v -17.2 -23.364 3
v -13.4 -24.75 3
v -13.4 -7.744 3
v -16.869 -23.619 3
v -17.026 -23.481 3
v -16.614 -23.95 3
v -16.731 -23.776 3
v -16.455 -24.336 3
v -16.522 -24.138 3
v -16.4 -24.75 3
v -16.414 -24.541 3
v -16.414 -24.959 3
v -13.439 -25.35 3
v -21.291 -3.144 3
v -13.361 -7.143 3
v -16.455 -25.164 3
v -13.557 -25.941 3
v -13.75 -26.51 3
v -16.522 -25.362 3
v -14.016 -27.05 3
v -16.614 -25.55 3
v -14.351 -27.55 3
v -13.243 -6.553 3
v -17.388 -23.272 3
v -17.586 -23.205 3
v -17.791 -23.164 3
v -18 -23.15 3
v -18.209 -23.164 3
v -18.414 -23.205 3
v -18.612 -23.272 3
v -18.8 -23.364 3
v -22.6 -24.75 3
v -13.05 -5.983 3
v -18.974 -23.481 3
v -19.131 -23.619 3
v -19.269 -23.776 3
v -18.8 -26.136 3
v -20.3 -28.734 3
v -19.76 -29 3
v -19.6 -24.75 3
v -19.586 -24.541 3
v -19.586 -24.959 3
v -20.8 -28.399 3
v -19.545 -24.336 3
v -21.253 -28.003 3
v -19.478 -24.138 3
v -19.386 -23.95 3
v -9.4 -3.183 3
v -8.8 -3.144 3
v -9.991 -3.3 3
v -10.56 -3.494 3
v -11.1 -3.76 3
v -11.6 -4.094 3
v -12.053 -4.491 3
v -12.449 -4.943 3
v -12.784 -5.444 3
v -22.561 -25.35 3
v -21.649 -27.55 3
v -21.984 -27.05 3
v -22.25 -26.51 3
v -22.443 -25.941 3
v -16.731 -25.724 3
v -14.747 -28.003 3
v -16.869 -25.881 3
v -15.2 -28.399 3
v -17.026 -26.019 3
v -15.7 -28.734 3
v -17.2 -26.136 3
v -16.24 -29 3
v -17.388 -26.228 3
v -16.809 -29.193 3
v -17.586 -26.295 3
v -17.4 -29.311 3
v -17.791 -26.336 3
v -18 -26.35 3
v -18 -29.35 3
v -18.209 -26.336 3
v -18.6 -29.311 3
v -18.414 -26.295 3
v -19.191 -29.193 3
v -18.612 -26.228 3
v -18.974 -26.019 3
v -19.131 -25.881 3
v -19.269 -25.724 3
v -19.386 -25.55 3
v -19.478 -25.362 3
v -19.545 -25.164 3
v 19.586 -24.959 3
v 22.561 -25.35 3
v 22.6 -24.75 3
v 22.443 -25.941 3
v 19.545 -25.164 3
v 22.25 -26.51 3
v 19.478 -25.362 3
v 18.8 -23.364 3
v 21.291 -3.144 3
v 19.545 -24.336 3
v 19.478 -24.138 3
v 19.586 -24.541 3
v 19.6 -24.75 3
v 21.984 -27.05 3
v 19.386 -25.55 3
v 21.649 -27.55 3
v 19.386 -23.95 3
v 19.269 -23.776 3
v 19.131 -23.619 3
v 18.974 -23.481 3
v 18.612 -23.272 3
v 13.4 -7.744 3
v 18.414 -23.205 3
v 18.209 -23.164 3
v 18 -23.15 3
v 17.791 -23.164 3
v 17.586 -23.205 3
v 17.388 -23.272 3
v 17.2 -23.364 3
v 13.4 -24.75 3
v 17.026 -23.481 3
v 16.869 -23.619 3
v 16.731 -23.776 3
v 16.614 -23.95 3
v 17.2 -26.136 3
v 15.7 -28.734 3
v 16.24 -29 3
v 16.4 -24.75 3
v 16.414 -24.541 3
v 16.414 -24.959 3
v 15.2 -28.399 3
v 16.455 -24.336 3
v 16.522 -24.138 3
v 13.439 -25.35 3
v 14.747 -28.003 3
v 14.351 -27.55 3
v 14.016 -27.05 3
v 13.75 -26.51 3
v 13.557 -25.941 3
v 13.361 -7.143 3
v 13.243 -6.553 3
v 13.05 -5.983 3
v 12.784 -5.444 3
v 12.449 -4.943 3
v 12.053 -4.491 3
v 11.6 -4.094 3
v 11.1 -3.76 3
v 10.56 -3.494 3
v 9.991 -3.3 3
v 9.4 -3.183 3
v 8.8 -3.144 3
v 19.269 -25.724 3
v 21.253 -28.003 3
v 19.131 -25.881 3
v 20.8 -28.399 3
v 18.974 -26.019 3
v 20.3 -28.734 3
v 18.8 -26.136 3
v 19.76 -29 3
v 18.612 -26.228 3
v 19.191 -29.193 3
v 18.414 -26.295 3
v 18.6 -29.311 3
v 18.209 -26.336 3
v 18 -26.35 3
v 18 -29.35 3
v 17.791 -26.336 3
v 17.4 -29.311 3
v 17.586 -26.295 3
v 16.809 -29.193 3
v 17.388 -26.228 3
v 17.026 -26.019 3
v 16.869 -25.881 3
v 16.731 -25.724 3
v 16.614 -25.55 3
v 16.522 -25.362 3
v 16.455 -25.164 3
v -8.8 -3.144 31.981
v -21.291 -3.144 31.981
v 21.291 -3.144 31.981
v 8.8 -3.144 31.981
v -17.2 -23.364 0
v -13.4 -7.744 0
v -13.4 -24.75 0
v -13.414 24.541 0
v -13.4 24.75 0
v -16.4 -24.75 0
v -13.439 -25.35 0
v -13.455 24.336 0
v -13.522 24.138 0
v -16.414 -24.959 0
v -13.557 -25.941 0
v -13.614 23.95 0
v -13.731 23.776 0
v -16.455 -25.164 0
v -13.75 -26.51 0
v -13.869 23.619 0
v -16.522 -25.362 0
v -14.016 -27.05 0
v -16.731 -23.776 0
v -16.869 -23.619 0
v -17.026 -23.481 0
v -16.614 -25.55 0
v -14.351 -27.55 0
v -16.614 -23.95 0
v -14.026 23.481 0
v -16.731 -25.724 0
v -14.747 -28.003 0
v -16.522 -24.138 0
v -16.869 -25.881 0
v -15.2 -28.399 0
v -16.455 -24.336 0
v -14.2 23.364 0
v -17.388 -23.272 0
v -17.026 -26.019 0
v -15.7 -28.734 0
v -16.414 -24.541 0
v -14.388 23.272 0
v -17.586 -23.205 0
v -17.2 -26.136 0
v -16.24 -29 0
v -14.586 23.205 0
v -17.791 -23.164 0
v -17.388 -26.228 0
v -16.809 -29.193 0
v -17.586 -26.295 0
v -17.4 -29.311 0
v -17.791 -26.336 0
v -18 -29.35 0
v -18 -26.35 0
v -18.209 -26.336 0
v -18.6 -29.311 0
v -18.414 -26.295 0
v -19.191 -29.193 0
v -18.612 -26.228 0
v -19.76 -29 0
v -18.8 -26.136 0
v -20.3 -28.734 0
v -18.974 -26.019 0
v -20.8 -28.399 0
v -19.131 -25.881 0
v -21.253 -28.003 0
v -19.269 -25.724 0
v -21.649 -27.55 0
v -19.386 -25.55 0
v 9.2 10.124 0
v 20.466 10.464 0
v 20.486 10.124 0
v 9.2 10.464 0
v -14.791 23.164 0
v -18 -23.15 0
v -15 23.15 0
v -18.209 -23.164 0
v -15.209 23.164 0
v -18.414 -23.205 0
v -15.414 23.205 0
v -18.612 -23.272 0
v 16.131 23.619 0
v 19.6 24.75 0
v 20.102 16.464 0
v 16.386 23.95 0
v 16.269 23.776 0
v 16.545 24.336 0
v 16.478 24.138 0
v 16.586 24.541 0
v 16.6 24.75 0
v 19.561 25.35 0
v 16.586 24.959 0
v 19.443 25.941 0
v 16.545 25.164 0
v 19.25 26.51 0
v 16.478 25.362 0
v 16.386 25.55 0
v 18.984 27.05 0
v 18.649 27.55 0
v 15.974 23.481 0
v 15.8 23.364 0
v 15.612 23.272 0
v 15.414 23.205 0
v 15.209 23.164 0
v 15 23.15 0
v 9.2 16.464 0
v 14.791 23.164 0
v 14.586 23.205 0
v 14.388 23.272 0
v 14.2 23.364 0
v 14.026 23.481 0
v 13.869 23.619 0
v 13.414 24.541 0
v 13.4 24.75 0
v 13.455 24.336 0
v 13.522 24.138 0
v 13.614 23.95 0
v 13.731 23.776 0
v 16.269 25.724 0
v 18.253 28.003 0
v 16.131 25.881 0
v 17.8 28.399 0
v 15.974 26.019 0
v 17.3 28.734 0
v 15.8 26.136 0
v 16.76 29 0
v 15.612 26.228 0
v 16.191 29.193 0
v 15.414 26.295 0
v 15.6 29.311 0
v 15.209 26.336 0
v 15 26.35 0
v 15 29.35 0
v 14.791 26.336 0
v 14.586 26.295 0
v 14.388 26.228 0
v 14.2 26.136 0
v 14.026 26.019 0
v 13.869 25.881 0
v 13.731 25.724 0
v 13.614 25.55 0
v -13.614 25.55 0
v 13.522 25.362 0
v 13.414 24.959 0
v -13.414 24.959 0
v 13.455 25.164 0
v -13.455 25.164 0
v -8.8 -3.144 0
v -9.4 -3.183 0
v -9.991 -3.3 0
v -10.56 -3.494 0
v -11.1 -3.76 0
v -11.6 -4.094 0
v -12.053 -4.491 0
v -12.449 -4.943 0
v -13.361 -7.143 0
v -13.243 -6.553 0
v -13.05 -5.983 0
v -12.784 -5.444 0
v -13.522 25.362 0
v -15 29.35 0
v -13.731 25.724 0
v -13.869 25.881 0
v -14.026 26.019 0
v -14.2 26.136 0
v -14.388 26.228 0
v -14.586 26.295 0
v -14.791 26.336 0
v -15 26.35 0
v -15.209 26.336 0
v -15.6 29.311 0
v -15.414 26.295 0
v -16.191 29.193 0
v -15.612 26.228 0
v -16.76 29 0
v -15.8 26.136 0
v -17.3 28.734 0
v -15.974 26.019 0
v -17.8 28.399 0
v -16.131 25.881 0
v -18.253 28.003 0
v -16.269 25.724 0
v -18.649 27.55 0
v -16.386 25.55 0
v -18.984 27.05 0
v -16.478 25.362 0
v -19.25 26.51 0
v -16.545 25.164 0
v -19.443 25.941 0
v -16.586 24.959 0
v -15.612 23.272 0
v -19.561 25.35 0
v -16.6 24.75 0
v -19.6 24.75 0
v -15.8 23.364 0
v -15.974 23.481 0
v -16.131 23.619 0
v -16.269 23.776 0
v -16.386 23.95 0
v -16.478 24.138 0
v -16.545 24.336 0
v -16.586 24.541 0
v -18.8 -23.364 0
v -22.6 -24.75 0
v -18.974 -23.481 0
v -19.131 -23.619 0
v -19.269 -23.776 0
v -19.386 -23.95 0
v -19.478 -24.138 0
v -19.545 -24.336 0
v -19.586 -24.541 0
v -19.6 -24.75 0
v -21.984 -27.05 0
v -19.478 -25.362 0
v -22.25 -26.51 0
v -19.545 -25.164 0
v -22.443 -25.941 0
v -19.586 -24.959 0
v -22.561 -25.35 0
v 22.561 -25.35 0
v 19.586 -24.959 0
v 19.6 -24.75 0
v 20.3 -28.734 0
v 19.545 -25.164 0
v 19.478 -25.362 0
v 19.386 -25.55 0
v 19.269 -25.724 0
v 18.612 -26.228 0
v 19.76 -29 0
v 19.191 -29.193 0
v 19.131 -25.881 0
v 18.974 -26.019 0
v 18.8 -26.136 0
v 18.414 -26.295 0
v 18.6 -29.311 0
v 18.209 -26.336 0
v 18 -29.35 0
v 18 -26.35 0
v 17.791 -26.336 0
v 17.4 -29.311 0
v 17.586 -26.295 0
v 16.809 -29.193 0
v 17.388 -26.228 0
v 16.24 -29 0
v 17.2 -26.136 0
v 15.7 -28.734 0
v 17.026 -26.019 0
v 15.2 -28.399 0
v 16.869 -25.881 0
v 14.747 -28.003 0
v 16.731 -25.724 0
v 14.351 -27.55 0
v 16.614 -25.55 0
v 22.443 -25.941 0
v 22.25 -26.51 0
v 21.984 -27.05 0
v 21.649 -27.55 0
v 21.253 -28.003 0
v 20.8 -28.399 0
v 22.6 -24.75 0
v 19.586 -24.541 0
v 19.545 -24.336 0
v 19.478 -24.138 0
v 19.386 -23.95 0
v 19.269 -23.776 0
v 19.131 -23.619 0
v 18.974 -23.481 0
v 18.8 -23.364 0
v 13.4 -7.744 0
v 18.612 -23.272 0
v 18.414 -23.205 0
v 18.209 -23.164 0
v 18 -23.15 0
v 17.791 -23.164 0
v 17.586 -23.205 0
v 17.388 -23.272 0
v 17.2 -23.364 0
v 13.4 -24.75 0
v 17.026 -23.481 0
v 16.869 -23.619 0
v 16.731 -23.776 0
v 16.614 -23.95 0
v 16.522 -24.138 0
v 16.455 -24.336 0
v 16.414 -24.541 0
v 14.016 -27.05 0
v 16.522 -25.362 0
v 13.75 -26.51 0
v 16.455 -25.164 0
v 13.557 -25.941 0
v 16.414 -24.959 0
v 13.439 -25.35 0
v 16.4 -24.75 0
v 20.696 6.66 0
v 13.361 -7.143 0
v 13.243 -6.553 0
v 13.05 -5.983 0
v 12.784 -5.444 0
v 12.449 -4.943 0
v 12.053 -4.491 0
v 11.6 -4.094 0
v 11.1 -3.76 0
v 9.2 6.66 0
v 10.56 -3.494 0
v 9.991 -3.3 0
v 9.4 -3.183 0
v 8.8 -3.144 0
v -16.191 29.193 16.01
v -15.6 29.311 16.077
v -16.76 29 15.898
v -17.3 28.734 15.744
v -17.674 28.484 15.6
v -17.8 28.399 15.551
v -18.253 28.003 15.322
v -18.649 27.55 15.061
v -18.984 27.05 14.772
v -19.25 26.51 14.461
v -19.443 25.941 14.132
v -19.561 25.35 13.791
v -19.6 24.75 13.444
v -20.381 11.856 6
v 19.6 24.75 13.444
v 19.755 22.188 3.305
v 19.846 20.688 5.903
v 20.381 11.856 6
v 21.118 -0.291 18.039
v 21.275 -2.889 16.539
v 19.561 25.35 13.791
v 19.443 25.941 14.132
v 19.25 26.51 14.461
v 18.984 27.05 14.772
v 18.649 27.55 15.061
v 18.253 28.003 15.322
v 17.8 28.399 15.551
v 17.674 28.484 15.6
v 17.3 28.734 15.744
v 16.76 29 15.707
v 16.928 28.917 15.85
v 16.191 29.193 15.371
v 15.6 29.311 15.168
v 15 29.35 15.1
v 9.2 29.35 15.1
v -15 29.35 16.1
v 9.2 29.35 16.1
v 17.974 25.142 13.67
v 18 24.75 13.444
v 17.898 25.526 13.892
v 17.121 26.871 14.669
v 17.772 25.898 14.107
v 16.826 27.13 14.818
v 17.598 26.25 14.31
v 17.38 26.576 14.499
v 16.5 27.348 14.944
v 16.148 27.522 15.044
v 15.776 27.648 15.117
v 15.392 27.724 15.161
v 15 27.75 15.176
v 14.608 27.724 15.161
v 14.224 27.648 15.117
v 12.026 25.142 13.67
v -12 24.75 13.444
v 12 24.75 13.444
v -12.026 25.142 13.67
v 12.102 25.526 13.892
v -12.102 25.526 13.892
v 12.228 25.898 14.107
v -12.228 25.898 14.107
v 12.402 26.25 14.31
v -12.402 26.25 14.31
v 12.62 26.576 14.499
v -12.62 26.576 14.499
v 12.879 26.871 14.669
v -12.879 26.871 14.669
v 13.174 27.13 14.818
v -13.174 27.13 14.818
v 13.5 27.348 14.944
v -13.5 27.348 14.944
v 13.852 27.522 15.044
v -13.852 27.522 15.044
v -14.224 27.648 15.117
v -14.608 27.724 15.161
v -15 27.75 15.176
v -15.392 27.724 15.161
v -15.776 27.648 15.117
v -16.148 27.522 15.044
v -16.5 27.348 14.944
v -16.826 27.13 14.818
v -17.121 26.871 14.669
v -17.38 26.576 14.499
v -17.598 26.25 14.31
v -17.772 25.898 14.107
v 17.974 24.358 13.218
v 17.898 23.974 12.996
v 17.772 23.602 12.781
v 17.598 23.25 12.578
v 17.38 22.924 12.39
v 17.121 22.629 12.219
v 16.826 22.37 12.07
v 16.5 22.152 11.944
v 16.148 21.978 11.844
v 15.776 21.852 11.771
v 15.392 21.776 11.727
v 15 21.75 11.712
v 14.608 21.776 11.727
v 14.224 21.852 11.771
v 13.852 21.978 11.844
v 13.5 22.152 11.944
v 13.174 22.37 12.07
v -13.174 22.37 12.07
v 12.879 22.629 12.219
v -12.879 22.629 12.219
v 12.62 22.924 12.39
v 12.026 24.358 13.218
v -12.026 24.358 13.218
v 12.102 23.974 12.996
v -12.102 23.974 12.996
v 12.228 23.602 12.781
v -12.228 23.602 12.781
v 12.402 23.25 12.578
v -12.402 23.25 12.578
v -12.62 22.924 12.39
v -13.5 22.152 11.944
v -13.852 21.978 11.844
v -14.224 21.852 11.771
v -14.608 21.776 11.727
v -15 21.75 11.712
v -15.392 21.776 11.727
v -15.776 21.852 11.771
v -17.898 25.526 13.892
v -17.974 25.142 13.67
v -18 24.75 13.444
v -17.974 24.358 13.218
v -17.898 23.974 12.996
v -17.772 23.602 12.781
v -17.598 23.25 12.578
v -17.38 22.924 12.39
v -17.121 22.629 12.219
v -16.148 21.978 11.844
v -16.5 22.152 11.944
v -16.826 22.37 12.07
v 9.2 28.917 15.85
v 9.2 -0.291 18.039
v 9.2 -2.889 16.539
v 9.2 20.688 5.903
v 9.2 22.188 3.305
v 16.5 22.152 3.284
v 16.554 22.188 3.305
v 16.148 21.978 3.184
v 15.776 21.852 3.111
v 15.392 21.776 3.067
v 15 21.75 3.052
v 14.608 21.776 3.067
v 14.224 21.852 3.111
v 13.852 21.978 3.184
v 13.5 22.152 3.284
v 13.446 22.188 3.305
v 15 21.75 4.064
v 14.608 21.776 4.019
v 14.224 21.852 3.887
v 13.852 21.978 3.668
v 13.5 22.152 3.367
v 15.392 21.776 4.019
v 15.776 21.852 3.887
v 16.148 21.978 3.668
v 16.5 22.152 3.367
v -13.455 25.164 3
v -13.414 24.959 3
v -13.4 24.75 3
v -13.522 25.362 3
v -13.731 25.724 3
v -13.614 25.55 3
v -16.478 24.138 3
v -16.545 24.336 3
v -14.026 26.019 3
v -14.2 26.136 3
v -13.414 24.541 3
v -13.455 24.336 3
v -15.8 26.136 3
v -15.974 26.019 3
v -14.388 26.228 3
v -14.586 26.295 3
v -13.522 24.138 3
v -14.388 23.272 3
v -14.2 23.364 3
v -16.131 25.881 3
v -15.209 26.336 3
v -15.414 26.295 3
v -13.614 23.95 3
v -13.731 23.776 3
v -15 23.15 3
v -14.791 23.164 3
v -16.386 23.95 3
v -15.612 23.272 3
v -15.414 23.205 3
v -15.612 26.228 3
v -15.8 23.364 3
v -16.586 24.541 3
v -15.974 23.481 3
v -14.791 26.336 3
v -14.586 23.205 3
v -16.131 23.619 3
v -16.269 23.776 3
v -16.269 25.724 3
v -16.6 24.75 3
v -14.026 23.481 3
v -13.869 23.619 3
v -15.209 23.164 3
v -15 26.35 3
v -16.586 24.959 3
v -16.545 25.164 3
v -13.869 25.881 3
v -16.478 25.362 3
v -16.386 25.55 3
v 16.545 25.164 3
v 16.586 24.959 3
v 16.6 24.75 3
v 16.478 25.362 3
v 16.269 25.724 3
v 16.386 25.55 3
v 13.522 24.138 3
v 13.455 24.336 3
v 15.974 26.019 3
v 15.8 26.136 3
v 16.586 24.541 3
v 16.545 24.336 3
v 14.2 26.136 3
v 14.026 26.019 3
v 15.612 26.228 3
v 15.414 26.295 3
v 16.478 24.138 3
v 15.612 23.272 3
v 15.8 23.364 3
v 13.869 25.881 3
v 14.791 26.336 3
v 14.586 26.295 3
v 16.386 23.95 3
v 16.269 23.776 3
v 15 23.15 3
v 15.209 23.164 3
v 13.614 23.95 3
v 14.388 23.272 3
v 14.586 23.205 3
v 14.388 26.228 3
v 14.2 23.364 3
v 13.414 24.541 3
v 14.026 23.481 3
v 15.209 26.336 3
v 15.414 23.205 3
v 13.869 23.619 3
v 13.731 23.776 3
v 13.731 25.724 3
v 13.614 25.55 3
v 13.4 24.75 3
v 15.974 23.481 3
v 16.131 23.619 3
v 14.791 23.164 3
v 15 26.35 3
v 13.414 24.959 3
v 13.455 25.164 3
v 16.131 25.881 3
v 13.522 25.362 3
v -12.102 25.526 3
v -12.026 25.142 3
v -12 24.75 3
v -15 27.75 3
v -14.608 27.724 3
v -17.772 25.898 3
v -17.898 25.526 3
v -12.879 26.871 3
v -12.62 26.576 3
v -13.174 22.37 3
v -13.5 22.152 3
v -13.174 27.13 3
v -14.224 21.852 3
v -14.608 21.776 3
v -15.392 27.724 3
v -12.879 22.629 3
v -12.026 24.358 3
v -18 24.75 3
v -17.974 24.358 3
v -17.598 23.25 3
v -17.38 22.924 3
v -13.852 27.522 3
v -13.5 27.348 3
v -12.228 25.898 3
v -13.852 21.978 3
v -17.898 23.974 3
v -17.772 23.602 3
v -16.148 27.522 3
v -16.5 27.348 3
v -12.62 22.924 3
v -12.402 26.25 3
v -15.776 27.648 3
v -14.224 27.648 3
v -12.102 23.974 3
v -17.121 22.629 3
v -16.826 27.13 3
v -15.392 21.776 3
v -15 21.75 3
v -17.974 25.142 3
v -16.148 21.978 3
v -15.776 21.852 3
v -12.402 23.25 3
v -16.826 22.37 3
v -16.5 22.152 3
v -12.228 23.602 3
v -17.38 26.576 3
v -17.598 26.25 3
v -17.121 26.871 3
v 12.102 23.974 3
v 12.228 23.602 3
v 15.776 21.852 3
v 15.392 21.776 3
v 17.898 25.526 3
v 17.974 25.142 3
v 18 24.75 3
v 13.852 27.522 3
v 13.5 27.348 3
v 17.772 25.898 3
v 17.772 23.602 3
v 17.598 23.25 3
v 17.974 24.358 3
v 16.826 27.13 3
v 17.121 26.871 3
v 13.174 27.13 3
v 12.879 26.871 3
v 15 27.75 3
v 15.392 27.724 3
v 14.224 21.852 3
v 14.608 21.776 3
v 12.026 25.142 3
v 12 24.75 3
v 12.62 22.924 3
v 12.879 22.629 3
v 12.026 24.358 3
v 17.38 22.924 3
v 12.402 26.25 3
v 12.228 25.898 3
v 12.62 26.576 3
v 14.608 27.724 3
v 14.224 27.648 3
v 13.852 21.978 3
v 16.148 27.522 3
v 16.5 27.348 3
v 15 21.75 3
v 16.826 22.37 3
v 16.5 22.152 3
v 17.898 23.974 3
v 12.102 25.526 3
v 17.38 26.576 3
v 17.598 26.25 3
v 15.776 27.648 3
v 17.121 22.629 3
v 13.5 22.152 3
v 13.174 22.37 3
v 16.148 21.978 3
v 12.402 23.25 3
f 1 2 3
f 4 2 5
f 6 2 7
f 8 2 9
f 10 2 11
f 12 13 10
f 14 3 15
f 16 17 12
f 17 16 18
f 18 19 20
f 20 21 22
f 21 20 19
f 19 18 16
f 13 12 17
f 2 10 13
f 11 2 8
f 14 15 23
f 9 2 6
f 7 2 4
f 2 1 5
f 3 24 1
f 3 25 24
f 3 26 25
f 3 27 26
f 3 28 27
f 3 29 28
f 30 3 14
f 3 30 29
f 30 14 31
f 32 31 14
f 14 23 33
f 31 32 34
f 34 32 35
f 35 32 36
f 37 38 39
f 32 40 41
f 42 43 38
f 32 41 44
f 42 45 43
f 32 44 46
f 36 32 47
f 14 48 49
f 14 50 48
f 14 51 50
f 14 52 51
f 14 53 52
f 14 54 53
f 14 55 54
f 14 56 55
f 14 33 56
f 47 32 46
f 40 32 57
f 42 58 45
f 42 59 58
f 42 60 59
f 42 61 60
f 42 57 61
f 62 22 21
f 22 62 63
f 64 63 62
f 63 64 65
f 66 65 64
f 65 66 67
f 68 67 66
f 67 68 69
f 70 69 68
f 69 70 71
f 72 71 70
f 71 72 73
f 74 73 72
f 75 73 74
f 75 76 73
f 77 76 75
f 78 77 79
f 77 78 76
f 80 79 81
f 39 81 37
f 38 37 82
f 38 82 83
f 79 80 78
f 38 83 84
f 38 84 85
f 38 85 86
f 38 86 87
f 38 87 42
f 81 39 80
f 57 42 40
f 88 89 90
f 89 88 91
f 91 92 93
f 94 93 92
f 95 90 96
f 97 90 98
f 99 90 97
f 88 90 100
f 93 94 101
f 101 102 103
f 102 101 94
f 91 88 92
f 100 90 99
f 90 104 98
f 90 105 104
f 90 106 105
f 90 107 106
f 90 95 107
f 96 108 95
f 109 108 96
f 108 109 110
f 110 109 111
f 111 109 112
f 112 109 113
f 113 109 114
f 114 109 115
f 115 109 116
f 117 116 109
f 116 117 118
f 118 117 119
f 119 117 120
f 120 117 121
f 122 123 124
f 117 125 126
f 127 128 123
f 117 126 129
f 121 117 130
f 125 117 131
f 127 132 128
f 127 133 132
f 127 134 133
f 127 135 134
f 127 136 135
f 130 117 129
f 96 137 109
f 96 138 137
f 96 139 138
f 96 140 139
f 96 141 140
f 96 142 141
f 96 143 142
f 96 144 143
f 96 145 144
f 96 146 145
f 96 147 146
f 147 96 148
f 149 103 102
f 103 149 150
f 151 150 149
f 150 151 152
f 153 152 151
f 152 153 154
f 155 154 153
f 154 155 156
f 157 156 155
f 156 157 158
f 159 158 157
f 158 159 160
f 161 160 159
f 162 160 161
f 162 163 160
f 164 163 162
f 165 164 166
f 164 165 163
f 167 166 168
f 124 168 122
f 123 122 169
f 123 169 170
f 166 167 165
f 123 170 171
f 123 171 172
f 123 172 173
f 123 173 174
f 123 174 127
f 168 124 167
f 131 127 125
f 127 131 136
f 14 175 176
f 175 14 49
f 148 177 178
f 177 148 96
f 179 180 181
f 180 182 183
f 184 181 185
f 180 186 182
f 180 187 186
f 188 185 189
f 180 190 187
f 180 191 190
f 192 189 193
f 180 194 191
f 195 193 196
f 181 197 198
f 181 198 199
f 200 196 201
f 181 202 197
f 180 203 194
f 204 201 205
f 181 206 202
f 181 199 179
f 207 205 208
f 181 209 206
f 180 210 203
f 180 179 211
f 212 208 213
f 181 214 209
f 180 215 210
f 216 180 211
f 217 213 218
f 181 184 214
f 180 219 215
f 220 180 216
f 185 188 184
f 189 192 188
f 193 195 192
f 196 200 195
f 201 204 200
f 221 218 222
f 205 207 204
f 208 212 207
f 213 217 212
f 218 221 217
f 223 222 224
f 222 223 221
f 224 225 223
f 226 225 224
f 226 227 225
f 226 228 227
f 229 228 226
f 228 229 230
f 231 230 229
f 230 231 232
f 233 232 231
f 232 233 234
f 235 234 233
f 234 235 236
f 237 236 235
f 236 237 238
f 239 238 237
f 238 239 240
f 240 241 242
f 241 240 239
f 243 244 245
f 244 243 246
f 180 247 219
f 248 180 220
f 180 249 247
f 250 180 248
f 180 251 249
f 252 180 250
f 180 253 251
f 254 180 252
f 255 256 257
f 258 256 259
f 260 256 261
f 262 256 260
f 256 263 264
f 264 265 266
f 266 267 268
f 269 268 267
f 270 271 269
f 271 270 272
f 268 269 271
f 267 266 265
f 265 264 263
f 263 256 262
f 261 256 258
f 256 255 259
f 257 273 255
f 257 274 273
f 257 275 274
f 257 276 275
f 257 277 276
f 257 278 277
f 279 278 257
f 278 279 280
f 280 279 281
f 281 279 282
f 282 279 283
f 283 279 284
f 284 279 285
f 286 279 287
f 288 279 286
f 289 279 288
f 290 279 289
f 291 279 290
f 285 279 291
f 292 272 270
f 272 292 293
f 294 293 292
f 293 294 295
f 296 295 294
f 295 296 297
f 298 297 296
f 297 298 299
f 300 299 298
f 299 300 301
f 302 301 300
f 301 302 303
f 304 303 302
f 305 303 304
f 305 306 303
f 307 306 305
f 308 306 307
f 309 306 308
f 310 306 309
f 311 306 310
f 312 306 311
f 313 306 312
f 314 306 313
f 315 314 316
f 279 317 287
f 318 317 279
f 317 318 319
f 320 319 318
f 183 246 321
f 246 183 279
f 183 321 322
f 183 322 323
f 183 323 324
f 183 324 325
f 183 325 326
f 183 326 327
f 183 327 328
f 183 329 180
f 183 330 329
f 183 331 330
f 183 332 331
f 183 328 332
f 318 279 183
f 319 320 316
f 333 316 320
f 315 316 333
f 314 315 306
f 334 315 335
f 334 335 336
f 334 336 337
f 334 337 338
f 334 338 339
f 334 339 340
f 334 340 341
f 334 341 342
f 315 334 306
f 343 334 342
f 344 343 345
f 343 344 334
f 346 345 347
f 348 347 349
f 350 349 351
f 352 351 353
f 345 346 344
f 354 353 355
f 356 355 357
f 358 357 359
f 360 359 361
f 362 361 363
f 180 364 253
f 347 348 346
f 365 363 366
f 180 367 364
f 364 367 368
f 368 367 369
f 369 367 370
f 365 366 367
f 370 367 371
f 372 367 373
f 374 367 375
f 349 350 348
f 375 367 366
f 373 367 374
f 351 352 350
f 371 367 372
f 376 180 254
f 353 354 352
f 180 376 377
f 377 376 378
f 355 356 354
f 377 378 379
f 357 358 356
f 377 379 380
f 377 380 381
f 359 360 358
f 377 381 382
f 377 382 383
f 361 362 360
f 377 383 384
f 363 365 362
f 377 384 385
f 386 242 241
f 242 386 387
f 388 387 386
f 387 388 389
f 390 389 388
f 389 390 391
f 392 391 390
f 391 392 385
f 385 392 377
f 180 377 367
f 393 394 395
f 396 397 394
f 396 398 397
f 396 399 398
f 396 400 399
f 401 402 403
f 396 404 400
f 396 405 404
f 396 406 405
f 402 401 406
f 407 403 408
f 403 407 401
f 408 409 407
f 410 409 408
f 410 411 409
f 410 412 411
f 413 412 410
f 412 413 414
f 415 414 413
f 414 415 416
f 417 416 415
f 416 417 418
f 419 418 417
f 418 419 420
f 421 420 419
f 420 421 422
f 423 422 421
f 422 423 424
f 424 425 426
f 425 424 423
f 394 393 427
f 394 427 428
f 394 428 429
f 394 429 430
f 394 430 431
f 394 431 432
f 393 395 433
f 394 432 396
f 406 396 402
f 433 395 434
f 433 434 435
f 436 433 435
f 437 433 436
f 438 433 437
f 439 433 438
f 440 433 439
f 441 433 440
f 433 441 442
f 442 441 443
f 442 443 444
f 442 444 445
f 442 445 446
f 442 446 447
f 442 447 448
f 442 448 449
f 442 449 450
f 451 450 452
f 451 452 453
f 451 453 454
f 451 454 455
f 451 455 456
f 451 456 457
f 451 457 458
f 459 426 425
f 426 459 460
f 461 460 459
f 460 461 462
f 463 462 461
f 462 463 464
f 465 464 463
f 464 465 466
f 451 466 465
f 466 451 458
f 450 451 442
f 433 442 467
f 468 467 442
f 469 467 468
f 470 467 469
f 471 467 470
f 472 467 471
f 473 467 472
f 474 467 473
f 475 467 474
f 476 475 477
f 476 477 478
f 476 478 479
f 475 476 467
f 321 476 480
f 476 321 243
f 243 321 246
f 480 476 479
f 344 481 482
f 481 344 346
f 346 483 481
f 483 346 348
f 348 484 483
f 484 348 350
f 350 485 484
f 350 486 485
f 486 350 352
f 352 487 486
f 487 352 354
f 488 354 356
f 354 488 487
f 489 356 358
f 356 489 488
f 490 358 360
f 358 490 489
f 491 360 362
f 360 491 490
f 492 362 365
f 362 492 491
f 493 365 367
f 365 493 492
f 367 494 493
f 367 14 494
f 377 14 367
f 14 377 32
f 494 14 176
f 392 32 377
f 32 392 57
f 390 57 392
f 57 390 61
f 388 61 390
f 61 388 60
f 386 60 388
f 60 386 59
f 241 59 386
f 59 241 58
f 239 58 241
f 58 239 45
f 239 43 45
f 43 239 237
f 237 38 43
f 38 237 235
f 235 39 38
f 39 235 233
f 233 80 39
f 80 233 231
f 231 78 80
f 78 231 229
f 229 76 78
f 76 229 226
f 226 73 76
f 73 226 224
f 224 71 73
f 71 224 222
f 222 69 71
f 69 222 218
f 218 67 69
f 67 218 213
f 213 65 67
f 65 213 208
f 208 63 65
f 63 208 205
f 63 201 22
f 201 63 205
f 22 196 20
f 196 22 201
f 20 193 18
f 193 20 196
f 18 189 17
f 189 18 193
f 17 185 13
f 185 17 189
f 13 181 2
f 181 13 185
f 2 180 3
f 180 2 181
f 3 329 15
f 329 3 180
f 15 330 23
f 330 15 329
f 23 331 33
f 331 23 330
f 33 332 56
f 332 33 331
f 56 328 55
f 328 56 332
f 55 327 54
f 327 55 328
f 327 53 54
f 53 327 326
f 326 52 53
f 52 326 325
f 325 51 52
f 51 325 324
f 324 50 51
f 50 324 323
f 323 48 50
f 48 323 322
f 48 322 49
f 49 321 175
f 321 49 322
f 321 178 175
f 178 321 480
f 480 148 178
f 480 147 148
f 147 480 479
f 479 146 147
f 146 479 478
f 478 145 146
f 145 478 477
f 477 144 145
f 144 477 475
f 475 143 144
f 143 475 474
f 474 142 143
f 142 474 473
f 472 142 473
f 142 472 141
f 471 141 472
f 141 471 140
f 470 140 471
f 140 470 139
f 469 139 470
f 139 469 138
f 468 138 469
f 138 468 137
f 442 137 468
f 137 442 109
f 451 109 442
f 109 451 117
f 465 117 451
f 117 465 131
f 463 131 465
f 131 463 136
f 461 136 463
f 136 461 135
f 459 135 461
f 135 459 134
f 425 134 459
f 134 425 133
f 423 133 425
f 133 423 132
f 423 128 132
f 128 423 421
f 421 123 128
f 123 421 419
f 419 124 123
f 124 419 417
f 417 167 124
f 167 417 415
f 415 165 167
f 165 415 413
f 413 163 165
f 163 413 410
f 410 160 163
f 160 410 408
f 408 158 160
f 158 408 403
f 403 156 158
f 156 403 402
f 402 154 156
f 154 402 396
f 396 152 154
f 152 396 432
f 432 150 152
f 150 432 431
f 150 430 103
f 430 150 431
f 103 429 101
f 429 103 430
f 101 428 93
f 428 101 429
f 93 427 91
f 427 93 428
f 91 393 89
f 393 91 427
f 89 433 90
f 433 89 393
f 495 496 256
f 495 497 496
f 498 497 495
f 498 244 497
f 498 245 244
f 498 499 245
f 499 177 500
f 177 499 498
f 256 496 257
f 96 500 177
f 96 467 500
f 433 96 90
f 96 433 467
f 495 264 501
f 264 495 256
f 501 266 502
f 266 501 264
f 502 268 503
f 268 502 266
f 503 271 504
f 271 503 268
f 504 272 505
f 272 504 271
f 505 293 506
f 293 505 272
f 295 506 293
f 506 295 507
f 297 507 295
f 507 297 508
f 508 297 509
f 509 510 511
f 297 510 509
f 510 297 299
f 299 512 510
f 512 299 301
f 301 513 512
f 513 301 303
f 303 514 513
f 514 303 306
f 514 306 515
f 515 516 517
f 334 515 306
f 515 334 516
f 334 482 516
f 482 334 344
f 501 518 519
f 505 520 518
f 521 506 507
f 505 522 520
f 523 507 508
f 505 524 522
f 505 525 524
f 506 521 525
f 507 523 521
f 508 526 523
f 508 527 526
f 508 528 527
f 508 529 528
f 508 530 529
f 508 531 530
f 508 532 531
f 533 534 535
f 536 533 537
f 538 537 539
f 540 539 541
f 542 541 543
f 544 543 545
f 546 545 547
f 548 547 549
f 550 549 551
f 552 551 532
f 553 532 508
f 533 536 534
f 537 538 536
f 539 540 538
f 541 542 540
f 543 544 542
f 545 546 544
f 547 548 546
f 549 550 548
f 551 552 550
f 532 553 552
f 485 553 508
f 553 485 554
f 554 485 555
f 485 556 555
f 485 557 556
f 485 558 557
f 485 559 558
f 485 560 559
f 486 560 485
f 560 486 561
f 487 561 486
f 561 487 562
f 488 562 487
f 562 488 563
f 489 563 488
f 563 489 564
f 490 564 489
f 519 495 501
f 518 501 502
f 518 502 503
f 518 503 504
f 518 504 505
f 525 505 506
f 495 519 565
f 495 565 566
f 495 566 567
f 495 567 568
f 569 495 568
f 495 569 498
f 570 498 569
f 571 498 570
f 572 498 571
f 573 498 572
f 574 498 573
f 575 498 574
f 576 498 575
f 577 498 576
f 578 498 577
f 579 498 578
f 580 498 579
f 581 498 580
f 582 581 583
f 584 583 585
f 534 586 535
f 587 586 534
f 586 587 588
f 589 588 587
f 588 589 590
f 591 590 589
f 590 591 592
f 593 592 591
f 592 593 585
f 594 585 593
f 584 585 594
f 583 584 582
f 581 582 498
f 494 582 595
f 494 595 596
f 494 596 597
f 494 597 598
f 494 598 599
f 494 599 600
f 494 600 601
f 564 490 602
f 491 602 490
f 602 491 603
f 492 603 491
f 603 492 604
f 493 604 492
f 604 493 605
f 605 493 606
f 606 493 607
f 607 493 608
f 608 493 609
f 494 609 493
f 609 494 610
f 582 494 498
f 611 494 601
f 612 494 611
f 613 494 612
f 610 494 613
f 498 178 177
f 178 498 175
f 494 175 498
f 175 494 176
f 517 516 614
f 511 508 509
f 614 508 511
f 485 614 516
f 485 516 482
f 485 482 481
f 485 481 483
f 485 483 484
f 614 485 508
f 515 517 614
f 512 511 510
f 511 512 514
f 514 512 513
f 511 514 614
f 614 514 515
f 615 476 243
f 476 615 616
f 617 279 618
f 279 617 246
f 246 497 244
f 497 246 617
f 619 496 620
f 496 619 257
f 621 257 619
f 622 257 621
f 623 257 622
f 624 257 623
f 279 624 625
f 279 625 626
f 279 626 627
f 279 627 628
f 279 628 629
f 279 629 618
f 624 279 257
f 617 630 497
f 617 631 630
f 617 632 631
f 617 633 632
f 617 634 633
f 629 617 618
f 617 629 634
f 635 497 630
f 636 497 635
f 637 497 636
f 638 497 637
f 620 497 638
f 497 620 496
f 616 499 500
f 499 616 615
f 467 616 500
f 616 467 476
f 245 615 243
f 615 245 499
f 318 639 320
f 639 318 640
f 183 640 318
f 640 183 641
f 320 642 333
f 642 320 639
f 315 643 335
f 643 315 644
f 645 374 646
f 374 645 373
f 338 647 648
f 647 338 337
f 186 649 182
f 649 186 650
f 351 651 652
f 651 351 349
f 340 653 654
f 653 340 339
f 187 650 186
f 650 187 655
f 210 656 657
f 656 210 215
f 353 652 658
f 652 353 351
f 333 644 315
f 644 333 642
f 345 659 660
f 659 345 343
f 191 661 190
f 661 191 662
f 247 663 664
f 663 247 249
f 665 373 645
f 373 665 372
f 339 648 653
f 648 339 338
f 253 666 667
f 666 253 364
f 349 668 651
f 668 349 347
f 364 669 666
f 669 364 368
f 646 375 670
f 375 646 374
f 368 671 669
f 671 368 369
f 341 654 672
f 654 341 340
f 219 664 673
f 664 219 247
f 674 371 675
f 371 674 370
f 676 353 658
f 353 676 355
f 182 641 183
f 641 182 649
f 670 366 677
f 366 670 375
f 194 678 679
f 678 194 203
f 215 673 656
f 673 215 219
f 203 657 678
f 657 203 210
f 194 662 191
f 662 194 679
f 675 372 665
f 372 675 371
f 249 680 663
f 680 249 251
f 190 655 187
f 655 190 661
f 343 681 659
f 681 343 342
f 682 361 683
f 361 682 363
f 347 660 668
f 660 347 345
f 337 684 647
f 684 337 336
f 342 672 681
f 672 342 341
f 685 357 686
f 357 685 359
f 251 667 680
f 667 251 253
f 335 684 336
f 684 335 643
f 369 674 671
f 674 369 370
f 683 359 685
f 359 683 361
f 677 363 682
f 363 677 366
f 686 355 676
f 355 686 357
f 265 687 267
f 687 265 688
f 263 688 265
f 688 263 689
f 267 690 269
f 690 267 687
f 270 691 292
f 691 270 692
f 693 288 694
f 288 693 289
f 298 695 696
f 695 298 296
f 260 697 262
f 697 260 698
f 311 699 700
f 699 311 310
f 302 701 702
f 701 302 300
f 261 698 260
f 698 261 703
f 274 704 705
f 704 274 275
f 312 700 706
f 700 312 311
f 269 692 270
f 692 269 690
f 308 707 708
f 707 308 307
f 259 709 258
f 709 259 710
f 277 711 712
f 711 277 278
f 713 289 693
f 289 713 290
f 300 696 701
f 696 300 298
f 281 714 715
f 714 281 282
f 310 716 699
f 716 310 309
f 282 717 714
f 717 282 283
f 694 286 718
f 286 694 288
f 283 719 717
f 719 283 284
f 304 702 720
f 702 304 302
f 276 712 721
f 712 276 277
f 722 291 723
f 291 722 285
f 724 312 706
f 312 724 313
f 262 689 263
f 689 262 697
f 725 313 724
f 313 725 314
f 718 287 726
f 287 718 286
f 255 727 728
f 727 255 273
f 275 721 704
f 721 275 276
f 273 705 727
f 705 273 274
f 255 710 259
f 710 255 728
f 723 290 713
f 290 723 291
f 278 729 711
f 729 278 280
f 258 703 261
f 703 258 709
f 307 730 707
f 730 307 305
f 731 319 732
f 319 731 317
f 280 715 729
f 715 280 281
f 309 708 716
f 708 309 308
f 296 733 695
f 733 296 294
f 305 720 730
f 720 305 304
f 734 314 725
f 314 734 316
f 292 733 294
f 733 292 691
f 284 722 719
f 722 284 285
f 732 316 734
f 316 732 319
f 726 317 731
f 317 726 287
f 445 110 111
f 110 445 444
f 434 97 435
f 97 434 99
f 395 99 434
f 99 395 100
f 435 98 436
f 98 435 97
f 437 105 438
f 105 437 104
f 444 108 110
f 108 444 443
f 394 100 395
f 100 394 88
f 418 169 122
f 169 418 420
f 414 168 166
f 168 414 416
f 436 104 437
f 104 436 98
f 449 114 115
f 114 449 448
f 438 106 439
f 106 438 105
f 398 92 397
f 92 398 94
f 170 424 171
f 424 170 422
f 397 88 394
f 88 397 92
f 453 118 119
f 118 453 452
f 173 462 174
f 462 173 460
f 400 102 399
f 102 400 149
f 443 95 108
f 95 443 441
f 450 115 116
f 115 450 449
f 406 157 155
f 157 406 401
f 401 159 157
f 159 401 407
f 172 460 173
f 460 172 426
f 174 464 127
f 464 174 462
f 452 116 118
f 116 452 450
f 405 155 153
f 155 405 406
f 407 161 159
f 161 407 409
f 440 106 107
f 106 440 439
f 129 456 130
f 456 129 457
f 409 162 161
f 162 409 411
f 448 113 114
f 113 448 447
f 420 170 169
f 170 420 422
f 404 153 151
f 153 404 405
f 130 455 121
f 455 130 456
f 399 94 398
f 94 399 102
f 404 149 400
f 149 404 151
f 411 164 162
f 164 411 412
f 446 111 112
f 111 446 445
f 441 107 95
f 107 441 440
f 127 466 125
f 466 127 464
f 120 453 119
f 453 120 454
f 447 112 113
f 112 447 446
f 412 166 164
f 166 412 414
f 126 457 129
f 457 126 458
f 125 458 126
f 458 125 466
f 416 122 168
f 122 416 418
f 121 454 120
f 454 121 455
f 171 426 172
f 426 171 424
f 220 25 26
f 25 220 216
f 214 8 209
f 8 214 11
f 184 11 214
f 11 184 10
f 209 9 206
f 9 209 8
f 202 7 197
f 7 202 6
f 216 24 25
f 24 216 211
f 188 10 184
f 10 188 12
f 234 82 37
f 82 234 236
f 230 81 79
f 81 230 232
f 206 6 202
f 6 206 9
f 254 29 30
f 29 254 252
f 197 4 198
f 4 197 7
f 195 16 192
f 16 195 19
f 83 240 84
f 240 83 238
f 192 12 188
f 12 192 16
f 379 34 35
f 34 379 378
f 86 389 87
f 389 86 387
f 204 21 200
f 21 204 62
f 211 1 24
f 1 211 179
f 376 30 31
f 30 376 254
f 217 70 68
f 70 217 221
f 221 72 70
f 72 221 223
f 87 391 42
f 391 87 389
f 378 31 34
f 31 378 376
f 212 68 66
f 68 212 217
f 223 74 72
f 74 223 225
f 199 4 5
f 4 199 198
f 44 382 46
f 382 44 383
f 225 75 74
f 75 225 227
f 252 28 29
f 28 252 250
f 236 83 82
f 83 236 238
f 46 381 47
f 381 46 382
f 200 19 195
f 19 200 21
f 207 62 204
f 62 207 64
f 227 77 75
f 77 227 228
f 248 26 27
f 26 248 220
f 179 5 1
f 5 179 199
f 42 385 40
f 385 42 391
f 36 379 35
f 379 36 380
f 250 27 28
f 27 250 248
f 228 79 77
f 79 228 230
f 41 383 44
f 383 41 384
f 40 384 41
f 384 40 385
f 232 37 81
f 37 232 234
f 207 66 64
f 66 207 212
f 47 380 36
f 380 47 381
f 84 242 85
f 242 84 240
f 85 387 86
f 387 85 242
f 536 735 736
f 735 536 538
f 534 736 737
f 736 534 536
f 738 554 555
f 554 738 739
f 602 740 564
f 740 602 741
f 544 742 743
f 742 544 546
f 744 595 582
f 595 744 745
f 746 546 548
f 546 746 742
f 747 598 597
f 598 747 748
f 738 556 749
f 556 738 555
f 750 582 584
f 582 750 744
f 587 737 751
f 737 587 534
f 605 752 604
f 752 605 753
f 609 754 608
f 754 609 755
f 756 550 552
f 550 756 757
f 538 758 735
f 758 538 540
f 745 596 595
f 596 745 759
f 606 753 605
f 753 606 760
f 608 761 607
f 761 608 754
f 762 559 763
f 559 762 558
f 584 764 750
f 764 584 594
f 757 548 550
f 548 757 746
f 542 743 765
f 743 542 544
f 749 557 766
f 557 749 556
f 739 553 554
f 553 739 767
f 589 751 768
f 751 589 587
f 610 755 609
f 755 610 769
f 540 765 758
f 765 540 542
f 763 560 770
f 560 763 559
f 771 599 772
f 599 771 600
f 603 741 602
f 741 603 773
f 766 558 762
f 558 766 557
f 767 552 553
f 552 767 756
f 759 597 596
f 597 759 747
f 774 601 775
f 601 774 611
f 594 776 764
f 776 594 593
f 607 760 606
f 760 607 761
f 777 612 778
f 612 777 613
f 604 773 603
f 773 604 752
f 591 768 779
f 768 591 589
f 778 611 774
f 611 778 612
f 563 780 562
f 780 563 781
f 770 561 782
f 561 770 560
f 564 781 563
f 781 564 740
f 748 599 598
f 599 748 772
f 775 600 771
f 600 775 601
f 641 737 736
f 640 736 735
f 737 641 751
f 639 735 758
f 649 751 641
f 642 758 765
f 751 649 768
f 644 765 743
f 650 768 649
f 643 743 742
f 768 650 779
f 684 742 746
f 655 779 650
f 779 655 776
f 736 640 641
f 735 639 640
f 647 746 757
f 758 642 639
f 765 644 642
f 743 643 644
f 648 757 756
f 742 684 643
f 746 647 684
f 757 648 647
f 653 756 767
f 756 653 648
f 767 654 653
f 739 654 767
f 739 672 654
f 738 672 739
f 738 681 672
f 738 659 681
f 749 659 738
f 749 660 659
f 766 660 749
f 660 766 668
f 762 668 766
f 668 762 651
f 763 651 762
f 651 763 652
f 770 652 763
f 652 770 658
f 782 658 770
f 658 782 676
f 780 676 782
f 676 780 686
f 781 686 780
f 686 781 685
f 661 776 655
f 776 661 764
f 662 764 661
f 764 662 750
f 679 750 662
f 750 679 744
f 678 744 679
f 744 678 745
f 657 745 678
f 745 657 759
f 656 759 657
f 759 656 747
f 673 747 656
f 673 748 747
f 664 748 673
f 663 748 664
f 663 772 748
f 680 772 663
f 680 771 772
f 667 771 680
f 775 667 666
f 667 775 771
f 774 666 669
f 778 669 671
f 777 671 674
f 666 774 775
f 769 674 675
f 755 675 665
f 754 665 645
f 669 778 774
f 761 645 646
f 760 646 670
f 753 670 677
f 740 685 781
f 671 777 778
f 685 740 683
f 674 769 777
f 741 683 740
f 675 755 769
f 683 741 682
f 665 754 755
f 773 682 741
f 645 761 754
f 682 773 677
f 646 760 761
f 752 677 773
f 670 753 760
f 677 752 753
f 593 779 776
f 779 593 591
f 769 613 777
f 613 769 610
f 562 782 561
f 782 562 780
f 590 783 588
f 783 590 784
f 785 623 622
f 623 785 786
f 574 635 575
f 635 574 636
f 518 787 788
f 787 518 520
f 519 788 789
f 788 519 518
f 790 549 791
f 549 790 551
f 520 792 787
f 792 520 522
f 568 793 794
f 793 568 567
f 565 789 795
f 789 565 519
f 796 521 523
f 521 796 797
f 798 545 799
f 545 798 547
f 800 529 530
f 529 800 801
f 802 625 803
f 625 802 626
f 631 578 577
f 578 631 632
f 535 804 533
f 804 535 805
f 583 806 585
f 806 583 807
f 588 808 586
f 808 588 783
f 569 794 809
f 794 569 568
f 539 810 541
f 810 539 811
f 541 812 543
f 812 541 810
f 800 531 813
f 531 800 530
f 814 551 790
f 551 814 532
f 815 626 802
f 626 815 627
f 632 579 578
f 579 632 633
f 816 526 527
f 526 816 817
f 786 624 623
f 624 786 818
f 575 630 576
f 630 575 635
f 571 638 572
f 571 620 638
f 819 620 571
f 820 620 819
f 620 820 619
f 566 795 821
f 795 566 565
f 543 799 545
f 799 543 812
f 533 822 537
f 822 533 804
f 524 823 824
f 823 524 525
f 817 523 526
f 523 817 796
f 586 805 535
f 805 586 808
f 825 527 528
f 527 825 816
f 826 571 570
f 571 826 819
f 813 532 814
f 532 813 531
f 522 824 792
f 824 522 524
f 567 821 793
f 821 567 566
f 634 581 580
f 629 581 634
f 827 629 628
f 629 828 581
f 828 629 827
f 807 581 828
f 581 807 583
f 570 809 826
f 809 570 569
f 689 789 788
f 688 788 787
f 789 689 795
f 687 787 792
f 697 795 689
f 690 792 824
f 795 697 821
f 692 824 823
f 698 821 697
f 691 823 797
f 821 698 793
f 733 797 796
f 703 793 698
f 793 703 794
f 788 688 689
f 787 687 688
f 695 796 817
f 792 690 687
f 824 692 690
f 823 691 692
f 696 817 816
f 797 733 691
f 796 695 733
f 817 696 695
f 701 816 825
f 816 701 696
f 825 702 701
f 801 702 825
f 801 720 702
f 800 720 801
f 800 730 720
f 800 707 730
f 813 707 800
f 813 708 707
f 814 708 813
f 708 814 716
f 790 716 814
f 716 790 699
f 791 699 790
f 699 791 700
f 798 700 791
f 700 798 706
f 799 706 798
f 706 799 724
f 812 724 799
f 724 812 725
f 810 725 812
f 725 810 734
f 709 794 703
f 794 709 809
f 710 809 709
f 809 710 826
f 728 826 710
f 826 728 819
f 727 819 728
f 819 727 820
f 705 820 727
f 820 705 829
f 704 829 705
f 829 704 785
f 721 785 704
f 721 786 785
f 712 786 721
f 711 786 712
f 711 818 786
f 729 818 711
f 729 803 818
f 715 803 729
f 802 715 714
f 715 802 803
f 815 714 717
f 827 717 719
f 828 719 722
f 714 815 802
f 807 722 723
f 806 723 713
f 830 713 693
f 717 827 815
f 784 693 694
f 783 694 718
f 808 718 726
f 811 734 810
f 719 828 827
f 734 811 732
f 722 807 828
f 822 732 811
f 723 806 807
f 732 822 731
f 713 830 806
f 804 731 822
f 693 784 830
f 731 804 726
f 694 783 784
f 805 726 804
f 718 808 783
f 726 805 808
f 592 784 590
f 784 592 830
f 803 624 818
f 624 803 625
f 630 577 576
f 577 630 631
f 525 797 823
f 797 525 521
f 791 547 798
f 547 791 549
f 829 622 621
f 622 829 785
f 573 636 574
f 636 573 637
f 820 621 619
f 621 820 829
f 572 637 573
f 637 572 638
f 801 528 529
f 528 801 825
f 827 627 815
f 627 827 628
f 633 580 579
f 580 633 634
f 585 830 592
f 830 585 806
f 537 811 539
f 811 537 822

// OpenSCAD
//Depth of camera
camera_depth = 20.2;
//Height of the supporting back
back_height = 30;
//C/C Distance between front holes
front_cc = 30;
//C/C Distance between rear holes
rear_cc = 36;
//C/C Distance between front and rear holes
front_rear_cc = 49.5;
//angle of camera
angle = 30; //[10:45]
//Thickness of the base
base_thickness = 3;
//Hole diameter (may need adjustment depending on printer)
hole_size = 3.2;
//Determines the amount of "meat" around the holes
edge_margin = 3;
//Diameter of screw head (to allow enough clerance)
screw_head_size = 6;
//Wedge offset from front
front_offset = 0;
//Add lip to fron of wedge
use_lip = "No"; //[Yes,No]
//Velcro strap width
velcro_width = 18;
//Velcro strap thickness
velcro_thickness = 3;
//Added height under the camera e.g. for prop clearence
added_height = 0;


//Calculated variables wont be visible to Thingiverse customizer
hole_clearence = edge_margin+hole_size/2;
screw_head_clerance = screw_head_size / 2;
hole_radius = hole_size / 2;
lip_thickness = use_lip == "Yes" ? 2*1 : 0*1;
lip_height =  use_lip == "Yes" ? 2*1 : 0*1;

//internal global varaibles
_xFrontOffset = front_cc/2;
_xRearOffset = rear_cc/2;
_xTotFrontOffset = front_cc/2+hole_clearence;
_xTotRearOffset = rear_cc/2+hole_clearence;
_yOffset = front_rear_cc/2;
_yTotOffset = front_rear_cc/2+hole_clearence;
_cameraHolderDepth = (lip_thickness+camera_depth)*cos(angle)+back_height*sin(angle)+lip_thickness;
_cameraHolderHeight = back_height*cos(angle) + base_thickness + velcro_thickness + added_height;
_wedgeStartYoffset = _yTotOffset - front_offset;
_wedgeEndYoffset = _yTotOffset - front_offset - _cameraHolderDepth;
_rearSpaceLeft = _yTotOffset * 2 - front_offset - _cameraHolderDepth;
_totWidth = front_cc > rear_cc ? front_cc + hole_clearence*2 : rear_cc + hole_clearence*2;
_velcroXpos = (velcro_width + edge_margin) < (front_cc+2*edge_margin+hole_size) / 2 ? 0 :  ((front_cc+2*edge_margin+hole_size) / 1 )-(velcro_width + edge_margin);

module createBase()
{   
           
    difference()
    {
        linear_extrude( height = _cameraHolderHeight)
        {
            union()
            {
                if( front_offset > 0 )
                {
                    polygon(
                                points = [  [-_xTotFrontOffset, _yOffset],
                                            [-_xFrontOffset+hole_clearence, _yOffset],
                                            [-_xFrontOffset+hole_clearence, _wedgeStartYoffset],
                                            [_xFrontOffset-hole_clearence, _wedgeStartYoffset],
                                            [_xFrontOffset-hole_clearence, _yOffset],
                                            [_xTotFrontOffset, _yOffset], 
                                            [_xTotRearOffset, -_yOffset], 
                                            [_xRearOffset-hole_clearence, -_yOffset], 
                                            [_xRearOffset-hole_clearence, _wedgeEndYoffset], 
                                            [-_xRearOffset+hole_clearence, _wedgeEndYoffset], 
                                            [-_xRearOffset+hole_clearence, -_yOffset], 
                                            [-_xTotRearOffset, -_yOffset] ], 
                                convexity = 10);
                } else {
                    polygon(
                                points = [  [-_xFrontOffset, _yOffset+hole_clearence],                                        [_xFrontOffset, _yOffset+hole_clearence], 
                                            [_xTotFrontOffset, _yOffset], 
                                            [_xTotRearOffset, -_yOffset], 
                                            [_xRearOffset-hole_clearence, -_yOffset], 
                                            [_xRearOffset-hole_clearence, _wedgeEndYoffset], 
                                            [-_xRearOffset+hole_clearence, _wedgeEndYoffset], 
                                            [-_xRearOffset+hole_clearence, -_yOffset], 
                                            [-_xTotRearOffset, -_yOffset],
                                            [-_xTotFrontOffset, _yOffset]],
                                convexity = 10);
                }
                translate([-_xFrontOffset, _yOffset, 0])
                circle(r=hole_clearence, center = false); 
                translate([_xFrontOffset, _yOffset, 0])
                circle(r=hole_clearence, center = false); 
                translate([_xRearOffset, -_yOffset, 0])
                circle(r=hole_clearence, center = false); 
                translate([-_xRearOffset, -_yOffset, 0])
                circle(r=hole_clearence, center = false); 
                if(front_offset > hole_clearence*2)
                {
                    difference()
                    {
                        union()
                        {
                            translate([_xFrontOffset-hole_clearence*2, _wedgeStartYoffset, 0])
                            square([hole_clearence,hole_clearence]);
                            translate([-_xFrontOffset+hole_clearence, _wedgeStartYoffset, 0])
                            square([hole_clearence,hole_clearence]);
                        }
                        union()
                        {
                            translate([_xFrontOffset-hole_clearence*2, _wedgeStartYoffset+hole_clearence, 0])
                            circle(r=hole_clearence, center = false); 
                            translate([-_xFrontOffset+hole_clearence*2, _wedgeStartYoffset+hole_clearence, 0])                circle(r=hole_clearence, center = false);   
                        }
                    }
                }
                if((_yTotOffset + _wedgeEndYoffset) > hole_clearence*2)
                {
                    difference()
                    {
                        union()
                        {
                            translate([_xRearOffset-hole_clearence*2, _wedgeEndYoffset-hole_clearence, 0])
                            square([hole_clearence,hole_clearence]);
                            translate([-_xRearOffset+hole_clearence, _wedgeEndYoffset-hole_clearence, 0])
                            square([hole_clearence,hole_clearence]);
                            
                        }
                        union()
                        {
                            translate([_xRearOffset-hole_clearence*2, _wedgeEndYoffset-hole_clearence, 0])
                            circle(r=hole_clearence, center = false); 
                            translate([-_xRearOffset+hole_clearence*2, _wedgeEndYoffset-hole_clearence, 0])
                            circle(r=hole_clearence, center = false); 
                        }
                    }
                }
            }
        }
        union()
        {
            translate([-_totWidth/2, _wedgeStartYoffset, base_thickness])
            cube([_totWidth,front_rear_cc,_cameraHolderHeight], center = false);
            rearSpace = _yTotOffset + _wedgeEndYoffset;
            translate([-_totWidth/2, _wedgeEndYoffset-rearSpace, base_thickness])
            cube([_totWidth,rearSpace,_cameraHolderHeight], center = false);
        }
    }    
}

module addWedge()
{
    totWidth = front_cc > rear_cc ? front_cc + edge_margin*2+hole_size: rear_cc + edge_margin*2+hole_size;
                xOffset = totWidth/2;  
    difference()
    {
        difference()
        {
            children();
            union()
            {
                          
                yOffset = (front_rear_cc/2+edge_margin+hole_size/2)-(lip_thickness+camera_depth)*cos(angle) -front_offset;
                translate([-xOffset, yOffset, base_thickness+velcro_thickness+added_height])
                rotate([angle,0,0])
                cube([totWidth, camera_depth, back_height+5], center = false);
                
            }
        }
       
        union()
       {
           yOffset = (front_rear_cc/2+edge_margin+hole_size/2)-lip_thickness*cos(angle) -front_offset; 
                zOffset = base_thickness+velcro_thickness + camera_depth*sin(angle) + added_height;
                translate([-xOffset, yOffset, zOffset])
                rotate([angle,0,0])
                translate([0, -1, lip_height])
                cube([totWidth, front_rear_cc, back_height+5], center = false);
                translate([-xOffset, yOffset, zOffset])
                rotate([angle,0,0])
                translate([0, lip_thickness, 0])
                cube([totWidth, front_rear_cc, back_height+5], center = false);
       }
    }
}

module addStrapHole()
{
    difference()
    {
        children();
        union()
        {
            yOffset = (front_rear_cc/2+edge_margin+hole_size/2)-lip_thickness*cos(angle) -front_offset; 
            zOffset = base_thickness+velcro_thickness + camera_depth*sin(angle);
            translate([0, yOffset, zOffset+added_height])
            rotate([angle,0,0])
            translate([_velcroXpos, 0, -zOffset+base_thickness])
            cube([velcro_width, lip_thickness+1, zOffset*2], center = true);
            ySize = camera_depth + base_thickness + velcro_thickness;
            translate([0, yOffset, zOffset])
            rotate([angle,0,0])            
            translate([_velcroXpos, -ySize, -base_thickness-velcro_thickness])
            cube([velcro_width, ySize+1, velcro_thickness], center = true);
            translate([0, yOffset, zOffset])
            rotate([angle,0,0])            
            translate([_velcroXpos, -ySize, -base_thickness-velcro_thickness])            
            cube([velcro_width, velcro_thickness, back_height*1.5], center = true);
            
        }
    }
}

module clearForScrews()
{
    xOffsetFront = front_cc/2;
    xOffsetRear = rear_cc/2;
    yOffset = front_rear_cc/2;
    
    difference()
    {
        children();
        union()
        {
            //Screw holes
            translate([-xOffsetFront, yOffset, (base_thickness+1)/2])
            cylinder(h=base_thickness+1, r=hole_radius, center = true); 
            translate([xOffsetFront, yOffset, (base_thickness+1)/2])
            cylinder(h=base_thickness+1, r=hole_radius, center = true); 
            translate([xOffsetRear, -yOffset, (base_thickness+1)/2])
            cylinder(h=base_thickness+1, r=hole_radius, center = true); 
            translate([-xOffsetRear, -yOffset, (base_thickness+1)/2])
            cylinder(h=base_thickness+1, r=hole_radius, center = true); 
            translate([xOffsetRear, -yOffset, 50+base_thickness])
            cylinder(h=100, r=screw_head_clerance, center = true);        translate([-xOffsetRear, -yOffset, 50+base_thickness])
            cylinder(h=100, r=screw_head_clerance, center = true);
            translate([-xOffsetFront, yOffset, 50+base_thickness])
            cylinder(h=100, r=screw_head_clerance, center = true);
            translate([xOffsetFront, yOffset, 50+base_thickness])
            cylinder(h=100, r=screw_head_clerance, center = true);             
        }
    }
}


$fn = 48;
clearForScrews()
{
    addStrapHole()
    {
        addWedge()
        {
            createBase();
        }
    }
}
